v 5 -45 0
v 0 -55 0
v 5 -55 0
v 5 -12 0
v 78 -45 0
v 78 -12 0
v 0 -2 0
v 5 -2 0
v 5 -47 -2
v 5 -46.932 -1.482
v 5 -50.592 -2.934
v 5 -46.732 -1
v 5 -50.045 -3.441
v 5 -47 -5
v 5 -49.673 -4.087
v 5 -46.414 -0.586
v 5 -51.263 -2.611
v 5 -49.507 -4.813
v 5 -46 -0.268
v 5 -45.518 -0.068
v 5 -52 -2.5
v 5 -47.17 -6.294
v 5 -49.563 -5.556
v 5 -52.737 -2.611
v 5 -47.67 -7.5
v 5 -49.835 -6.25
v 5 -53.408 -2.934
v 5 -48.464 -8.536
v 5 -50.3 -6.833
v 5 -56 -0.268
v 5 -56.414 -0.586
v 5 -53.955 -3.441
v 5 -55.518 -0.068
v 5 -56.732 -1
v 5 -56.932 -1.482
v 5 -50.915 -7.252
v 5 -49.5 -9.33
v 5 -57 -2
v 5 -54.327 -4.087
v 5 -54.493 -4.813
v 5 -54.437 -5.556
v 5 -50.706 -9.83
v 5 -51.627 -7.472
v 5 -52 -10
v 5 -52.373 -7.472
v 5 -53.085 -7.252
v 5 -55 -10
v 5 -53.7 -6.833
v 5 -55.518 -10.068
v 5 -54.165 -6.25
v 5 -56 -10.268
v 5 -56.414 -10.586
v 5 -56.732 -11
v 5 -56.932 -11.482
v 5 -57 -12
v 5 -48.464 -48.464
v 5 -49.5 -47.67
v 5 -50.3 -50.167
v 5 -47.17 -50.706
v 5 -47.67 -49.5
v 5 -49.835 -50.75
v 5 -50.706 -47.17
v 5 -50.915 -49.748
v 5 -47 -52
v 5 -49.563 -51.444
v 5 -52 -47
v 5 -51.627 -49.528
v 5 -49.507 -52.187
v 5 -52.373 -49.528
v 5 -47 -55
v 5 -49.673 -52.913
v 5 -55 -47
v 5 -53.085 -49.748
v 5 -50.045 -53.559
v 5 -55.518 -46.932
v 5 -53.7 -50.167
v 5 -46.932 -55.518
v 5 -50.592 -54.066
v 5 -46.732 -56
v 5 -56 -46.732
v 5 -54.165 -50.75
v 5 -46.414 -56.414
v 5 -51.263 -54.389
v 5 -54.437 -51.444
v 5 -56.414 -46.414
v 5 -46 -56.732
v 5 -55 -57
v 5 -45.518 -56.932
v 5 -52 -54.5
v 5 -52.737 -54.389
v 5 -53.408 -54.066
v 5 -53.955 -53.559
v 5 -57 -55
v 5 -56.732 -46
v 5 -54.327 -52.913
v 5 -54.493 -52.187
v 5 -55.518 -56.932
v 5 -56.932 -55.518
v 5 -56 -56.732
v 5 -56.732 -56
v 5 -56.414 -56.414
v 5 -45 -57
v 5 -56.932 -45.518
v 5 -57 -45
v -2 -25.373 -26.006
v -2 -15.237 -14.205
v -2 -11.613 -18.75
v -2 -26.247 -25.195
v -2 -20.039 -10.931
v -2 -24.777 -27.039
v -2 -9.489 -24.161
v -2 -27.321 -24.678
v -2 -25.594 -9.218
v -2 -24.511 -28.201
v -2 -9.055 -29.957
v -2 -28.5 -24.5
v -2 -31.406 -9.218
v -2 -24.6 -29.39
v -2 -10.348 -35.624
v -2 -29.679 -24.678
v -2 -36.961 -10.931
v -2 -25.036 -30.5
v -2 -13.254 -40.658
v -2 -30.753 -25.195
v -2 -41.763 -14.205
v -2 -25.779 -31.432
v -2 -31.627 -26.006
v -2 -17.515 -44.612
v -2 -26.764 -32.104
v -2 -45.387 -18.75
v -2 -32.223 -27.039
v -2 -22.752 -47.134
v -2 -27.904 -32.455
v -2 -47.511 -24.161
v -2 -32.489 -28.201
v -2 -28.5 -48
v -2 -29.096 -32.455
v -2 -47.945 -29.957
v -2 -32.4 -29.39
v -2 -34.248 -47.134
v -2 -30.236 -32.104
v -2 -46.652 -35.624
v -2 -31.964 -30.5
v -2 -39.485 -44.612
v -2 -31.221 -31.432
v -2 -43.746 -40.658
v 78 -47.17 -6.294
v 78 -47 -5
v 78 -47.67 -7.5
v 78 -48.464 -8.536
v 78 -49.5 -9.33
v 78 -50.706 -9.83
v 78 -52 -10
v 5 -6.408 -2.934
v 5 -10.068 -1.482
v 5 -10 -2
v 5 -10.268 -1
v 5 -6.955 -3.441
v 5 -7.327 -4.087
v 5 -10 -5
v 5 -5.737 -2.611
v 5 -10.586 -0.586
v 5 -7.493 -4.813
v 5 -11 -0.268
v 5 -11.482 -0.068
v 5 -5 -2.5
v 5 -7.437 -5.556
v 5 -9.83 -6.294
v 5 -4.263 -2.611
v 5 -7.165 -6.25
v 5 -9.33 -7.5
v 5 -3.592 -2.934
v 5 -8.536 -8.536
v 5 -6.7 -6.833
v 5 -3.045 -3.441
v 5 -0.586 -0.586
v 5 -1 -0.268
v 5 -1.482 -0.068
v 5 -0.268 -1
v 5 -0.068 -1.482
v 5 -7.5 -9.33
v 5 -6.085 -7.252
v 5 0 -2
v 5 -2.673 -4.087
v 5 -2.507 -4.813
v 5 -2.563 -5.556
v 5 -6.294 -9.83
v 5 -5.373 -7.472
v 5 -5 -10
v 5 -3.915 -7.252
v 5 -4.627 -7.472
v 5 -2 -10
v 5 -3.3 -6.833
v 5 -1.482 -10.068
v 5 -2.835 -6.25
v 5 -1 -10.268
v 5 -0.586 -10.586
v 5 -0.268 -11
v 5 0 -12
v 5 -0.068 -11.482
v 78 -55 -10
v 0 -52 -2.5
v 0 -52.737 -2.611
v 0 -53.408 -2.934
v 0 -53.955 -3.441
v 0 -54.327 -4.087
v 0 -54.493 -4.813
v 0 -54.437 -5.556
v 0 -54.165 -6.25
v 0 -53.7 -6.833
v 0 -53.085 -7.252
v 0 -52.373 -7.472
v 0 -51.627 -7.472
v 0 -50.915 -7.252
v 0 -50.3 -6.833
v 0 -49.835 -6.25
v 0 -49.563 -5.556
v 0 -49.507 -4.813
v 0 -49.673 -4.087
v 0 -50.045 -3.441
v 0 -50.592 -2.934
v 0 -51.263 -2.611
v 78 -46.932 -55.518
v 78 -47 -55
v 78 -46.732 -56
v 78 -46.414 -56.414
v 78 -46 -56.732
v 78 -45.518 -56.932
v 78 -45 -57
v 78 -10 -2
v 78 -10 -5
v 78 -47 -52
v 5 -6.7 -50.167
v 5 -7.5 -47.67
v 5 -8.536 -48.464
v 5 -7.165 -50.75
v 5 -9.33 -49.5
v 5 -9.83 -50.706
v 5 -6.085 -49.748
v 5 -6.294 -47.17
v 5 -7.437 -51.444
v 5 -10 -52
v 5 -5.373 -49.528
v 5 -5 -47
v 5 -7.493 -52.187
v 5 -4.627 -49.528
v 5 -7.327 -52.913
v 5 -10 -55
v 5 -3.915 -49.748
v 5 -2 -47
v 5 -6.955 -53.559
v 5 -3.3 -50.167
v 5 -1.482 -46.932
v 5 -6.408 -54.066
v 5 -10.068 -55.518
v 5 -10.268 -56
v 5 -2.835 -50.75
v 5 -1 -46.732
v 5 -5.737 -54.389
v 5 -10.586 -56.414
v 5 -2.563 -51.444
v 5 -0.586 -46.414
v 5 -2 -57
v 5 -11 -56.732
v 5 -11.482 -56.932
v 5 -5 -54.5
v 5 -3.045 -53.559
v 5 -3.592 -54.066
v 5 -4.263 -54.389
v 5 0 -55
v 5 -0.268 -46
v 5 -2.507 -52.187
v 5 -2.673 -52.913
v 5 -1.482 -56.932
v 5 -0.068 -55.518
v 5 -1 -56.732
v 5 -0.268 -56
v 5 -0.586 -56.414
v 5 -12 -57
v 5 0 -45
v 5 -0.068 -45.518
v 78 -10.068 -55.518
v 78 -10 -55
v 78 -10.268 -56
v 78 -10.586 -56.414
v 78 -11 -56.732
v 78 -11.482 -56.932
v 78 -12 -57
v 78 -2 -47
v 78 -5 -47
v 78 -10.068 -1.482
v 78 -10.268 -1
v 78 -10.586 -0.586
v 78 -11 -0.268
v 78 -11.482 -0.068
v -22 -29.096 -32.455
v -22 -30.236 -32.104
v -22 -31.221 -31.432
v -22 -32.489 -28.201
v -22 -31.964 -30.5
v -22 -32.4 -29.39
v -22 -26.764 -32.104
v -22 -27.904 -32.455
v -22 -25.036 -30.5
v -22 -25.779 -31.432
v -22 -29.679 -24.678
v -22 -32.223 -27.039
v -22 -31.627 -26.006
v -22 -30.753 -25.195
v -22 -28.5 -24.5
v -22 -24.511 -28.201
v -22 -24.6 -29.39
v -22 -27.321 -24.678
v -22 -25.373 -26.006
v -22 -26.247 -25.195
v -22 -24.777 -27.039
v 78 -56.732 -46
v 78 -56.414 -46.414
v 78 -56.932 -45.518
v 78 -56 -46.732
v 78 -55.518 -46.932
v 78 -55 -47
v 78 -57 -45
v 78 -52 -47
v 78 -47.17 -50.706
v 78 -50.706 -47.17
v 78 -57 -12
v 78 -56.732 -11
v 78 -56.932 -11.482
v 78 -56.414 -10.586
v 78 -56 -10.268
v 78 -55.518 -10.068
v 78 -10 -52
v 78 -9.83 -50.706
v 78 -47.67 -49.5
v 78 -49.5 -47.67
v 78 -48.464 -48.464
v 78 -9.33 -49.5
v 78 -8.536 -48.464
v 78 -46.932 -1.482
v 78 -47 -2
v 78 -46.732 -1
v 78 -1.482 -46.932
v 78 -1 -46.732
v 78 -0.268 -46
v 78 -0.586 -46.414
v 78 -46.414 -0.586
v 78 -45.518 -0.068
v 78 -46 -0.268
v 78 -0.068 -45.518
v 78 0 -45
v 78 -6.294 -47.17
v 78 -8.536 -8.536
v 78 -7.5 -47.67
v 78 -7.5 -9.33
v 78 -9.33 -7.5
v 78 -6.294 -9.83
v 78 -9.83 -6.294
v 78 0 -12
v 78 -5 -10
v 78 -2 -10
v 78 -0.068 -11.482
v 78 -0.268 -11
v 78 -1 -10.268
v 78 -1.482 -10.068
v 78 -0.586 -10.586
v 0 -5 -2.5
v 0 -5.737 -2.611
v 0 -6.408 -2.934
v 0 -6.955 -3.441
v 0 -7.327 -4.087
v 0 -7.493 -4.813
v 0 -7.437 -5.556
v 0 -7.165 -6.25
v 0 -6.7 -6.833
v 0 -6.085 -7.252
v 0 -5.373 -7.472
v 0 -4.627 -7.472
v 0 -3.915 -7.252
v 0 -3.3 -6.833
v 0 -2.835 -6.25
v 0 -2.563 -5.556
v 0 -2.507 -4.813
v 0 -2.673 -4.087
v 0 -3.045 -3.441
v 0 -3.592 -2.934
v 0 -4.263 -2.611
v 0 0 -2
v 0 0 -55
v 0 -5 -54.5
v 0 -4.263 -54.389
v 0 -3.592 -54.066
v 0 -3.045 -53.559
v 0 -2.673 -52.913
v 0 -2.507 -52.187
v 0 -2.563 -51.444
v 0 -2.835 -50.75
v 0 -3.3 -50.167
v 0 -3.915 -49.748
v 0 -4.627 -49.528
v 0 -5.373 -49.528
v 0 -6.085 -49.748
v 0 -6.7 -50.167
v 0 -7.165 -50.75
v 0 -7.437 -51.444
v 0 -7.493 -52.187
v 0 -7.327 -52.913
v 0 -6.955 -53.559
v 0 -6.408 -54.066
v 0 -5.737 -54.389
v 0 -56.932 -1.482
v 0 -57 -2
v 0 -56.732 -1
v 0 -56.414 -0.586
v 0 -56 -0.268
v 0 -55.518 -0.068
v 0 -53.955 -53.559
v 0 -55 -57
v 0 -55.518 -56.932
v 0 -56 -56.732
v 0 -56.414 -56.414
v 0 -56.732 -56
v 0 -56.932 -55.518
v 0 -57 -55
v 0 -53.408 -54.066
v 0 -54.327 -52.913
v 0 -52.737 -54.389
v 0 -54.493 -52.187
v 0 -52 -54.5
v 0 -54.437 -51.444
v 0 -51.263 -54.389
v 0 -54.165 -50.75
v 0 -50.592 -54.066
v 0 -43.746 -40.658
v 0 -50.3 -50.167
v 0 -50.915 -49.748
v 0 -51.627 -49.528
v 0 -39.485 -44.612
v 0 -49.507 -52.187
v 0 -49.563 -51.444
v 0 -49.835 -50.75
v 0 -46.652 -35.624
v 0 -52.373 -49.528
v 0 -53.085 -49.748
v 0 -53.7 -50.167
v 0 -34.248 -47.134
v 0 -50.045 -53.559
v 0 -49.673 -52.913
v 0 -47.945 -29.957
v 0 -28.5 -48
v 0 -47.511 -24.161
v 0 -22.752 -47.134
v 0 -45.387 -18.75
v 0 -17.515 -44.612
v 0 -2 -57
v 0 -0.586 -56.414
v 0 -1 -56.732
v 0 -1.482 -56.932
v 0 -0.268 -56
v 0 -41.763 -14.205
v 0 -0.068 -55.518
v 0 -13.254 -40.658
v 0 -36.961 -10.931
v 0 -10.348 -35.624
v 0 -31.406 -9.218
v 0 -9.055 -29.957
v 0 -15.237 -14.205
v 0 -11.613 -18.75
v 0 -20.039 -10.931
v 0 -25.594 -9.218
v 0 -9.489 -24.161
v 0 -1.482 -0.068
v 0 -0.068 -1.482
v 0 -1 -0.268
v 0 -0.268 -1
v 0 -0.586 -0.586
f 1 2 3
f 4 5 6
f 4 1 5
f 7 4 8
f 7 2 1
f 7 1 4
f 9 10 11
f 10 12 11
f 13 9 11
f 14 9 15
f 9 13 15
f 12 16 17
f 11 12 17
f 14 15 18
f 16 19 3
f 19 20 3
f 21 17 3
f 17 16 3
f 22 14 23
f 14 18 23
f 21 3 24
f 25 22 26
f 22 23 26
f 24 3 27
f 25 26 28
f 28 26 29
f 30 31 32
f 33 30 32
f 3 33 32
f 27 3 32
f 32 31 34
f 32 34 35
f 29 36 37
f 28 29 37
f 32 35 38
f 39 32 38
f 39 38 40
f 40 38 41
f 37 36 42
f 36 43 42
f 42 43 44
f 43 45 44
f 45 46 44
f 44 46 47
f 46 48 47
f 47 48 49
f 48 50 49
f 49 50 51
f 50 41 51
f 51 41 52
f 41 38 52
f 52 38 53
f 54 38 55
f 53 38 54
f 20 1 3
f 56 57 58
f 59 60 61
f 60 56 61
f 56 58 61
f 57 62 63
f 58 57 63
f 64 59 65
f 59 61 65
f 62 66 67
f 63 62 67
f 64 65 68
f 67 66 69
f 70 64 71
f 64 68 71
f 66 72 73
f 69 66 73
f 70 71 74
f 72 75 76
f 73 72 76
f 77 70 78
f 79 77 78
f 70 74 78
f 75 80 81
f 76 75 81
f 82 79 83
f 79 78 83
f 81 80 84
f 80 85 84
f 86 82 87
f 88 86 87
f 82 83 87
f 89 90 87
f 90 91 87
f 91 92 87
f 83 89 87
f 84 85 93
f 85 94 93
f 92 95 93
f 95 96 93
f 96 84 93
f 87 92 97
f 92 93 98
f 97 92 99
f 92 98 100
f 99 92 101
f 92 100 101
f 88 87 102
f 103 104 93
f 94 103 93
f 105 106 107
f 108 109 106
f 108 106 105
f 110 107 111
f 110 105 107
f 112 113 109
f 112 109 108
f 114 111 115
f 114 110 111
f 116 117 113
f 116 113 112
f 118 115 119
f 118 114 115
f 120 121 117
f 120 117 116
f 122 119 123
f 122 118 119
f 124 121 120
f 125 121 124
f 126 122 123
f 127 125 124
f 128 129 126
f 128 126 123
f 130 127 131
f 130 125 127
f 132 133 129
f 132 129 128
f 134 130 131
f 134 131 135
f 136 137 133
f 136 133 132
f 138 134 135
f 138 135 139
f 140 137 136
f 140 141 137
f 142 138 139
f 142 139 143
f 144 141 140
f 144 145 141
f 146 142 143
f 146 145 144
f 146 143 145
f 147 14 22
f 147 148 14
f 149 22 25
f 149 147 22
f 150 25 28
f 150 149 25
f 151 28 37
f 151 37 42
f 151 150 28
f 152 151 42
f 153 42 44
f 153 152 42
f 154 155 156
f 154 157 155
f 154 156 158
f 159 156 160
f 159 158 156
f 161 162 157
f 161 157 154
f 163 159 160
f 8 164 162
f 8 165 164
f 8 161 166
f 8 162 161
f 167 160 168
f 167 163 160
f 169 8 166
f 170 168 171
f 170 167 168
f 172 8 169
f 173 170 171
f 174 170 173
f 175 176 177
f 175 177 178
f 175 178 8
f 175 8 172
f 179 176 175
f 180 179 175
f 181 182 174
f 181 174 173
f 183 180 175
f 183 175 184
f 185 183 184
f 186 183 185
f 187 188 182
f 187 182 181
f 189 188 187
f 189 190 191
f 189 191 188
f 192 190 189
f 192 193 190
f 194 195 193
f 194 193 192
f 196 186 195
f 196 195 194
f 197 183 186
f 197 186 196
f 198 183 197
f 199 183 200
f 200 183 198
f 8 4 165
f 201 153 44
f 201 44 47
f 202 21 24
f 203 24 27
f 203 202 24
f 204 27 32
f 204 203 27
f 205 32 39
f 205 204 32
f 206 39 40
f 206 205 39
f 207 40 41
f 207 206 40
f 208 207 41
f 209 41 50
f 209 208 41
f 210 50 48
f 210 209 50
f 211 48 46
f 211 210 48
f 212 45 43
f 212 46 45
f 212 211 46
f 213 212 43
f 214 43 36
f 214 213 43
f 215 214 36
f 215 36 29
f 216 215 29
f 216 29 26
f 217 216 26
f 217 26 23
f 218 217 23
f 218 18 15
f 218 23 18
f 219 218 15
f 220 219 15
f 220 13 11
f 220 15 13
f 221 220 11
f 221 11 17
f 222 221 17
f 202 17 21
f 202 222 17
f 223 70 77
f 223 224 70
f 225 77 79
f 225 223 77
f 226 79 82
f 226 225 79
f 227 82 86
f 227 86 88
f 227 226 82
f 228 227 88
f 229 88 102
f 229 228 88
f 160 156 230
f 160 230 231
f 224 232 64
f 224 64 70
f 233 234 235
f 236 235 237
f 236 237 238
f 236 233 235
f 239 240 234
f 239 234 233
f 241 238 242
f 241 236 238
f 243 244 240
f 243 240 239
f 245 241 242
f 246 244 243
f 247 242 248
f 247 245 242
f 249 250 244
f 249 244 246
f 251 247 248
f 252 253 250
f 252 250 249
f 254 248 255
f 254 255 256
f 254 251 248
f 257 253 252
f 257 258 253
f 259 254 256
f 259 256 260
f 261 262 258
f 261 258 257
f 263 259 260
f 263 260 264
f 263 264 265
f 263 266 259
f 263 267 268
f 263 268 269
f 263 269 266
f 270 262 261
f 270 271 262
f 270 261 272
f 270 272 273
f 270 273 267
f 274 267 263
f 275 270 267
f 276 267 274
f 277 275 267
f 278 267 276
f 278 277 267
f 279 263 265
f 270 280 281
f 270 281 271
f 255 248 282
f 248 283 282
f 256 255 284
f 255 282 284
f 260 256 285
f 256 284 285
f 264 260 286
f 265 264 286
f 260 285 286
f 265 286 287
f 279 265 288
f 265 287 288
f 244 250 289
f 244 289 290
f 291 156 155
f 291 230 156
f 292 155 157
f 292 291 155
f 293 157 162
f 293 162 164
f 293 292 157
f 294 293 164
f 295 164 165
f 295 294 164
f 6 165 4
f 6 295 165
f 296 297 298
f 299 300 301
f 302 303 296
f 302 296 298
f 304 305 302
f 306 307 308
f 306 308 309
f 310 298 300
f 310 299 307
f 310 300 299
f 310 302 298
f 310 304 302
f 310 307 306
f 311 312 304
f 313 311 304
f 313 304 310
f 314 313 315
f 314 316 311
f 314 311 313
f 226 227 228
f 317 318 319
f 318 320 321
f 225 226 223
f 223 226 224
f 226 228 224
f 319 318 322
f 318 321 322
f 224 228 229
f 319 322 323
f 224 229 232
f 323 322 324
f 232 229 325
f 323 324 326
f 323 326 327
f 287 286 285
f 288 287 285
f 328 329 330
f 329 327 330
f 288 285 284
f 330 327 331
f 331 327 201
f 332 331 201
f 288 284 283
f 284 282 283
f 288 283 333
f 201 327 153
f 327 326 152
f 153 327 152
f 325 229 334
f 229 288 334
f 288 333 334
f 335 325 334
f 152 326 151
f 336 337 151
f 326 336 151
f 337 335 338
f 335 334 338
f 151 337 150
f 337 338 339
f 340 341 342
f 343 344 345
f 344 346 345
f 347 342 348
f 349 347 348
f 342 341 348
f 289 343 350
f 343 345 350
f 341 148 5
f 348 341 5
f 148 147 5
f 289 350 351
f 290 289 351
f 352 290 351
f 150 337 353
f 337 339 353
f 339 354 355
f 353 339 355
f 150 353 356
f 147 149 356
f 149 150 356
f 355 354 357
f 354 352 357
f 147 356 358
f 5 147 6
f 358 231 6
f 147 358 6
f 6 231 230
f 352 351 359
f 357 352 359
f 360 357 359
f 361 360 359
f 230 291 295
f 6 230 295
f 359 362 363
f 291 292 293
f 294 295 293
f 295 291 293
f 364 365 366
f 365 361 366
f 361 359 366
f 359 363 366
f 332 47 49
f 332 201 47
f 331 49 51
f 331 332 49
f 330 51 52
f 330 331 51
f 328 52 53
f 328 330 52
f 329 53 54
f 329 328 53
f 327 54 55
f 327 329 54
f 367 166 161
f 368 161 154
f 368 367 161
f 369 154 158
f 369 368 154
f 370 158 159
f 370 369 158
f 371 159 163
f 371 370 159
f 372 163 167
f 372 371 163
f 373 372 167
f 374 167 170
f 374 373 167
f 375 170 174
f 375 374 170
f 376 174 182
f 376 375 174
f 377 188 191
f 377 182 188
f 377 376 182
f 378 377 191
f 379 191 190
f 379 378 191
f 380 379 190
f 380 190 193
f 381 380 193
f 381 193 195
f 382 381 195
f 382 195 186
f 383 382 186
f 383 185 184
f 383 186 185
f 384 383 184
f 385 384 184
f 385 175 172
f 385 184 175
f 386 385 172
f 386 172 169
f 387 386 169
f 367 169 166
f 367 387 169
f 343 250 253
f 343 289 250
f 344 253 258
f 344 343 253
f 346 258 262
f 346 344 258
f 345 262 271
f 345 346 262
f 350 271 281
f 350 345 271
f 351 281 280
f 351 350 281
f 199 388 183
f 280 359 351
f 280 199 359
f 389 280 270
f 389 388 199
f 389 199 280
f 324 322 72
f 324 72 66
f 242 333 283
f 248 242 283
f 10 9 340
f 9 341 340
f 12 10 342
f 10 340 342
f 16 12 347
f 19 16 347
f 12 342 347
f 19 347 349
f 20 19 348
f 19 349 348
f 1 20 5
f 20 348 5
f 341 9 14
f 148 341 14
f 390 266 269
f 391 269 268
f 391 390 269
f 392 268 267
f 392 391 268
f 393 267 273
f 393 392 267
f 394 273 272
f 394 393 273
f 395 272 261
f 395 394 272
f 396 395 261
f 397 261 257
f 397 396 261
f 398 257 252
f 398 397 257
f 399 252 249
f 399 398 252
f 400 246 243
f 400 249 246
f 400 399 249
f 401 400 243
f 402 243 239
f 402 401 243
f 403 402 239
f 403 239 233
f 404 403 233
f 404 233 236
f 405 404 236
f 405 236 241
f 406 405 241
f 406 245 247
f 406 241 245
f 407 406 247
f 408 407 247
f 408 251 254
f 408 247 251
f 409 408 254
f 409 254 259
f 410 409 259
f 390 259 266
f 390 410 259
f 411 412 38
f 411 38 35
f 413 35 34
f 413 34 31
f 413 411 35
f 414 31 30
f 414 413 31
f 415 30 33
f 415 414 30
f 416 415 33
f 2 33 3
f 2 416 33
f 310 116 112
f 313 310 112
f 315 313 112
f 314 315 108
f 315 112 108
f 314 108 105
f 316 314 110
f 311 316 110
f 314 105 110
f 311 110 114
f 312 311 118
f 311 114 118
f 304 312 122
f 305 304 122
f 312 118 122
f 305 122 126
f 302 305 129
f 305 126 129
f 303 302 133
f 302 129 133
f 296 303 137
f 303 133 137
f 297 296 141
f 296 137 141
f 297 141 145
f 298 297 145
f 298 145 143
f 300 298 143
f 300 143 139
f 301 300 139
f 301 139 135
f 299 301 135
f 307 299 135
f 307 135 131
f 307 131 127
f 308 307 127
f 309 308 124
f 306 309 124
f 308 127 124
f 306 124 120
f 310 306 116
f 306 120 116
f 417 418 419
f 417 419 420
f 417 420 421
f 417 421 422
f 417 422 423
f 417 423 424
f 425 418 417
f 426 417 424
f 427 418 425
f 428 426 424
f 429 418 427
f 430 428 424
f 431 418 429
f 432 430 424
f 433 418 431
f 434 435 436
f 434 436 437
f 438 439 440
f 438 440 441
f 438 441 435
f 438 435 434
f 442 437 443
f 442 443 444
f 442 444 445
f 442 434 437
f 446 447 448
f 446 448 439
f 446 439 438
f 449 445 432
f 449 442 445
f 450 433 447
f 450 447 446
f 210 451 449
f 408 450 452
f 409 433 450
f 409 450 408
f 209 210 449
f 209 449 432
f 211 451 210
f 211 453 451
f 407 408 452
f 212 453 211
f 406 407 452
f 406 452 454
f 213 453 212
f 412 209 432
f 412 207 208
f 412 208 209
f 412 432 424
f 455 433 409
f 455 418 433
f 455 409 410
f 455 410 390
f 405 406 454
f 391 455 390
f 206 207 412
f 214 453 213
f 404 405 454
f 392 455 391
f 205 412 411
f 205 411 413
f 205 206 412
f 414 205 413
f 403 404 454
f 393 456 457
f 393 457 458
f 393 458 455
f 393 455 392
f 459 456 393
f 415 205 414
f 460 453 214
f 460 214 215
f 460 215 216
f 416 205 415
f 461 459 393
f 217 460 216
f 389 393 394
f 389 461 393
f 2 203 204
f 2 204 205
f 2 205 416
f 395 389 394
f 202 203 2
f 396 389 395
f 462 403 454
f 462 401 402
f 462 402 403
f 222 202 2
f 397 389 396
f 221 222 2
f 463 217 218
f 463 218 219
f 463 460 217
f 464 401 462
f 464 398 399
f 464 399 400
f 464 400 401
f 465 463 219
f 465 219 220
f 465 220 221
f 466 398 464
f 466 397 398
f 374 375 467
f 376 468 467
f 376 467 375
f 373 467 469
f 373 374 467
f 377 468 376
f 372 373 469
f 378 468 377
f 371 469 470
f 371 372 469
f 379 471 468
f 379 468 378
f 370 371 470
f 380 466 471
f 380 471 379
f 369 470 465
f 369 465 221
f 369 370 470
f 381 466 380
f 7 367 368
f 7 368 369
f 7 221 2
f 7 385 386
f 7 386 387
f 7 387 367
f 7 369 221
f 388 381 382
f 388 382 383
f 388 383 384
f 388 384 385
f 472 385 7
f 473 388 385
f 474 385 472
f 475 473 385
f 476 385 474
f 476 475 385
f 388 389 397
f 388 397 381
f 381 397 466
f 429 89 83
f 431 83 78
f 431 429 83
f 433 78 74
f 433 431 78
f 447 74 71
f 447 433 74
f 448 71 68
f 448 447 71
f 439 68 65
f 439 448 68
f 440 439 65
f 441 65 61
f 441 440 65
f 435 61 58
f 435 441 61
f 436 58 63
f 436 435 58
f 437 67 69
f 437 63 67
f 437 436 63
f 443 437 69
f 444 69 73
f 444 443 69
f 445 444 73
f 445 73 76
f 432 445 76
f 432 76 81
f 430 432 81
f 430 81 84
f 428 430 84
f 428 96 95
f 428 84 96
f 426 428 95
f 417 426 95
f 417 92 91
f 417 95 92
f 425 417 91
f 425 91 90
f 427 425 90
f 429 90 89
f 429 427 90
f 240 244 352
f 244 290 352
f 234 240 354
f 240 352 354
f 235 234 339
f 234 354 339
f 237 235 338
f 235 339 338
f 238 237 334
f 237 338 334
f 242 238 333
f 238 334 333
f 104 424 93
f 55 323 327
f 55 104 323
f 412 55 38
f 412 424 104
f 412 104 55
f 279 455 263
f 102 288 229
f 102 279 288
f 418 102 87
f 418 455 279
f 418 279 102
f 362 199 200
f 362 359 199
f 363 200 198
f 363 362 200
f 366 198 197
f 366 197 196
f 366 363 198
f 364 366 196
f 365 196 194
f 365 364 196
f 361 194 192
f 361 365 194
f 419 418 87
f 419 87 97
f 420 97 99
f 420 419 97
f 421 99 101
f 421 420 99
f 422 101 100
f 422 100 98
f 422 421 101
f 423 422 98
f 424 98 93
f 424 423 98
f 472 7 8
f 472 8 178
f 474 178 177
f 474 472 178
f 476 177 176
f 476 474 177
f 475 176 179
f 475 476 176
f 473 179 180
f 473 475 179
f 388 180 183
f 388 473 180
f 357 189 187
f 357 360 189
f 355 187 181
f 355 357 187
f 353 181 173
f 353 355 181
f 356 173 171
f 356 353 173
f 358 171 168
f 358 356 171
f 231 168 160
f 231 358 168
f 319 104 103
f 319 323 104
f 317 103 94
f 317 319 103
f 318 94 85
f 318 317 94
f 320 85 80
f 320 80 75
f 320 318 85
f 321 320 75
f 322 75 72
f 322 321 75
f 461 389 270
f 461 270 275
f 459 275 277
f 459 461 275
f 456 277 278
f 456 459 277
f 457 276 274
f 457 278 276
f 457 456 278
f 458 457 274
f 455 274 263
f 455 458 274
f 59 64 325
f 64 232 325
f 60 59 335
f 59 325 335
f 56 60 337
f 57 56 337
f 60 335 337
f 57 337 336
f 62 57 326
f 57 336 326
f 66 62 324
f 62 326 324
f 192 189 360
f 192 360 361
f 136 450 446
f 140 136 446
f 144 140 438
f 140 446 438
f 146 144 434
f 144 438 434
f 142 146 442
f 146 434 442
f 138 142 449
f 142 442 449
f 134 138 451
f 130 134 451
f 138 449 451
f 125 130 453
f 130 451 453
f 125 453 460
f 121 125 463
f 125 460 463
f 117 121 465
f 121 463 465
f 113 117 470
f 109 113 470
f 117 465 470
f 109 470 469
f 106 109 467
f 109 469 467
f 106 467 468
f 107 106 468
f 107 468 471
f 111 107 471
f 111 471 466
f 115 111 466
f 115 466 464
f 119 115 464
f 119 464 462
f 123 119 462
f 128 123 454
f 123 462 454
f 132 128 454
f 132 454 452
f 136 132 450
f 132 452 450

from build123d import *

# Parameters (mm, degrees)
SKETCH1_R            = 2.5
BOSS_EXTRUDE2_DEPTH  = 78
CUT_EXTRUDE1_START   = -73
CUT_EXTRUDE1_DEPTH   = 73
FILLET1_R            = 5
FILLET2_R            = 2
FILLET1_OF_MIRROR3_R = 5
FILLET3_R            = 2
SKETCH5_R            = 19.5
BOSS_EXTRUDE3_DEPTH  = 2
SKETCH6_R            = 4
BOSS_EXTRUDE4_DEPTH  = 20


with BuildPart() as part:
    # Sketch1 → Boss-Extrude2 (new body)
    with BuildSketch(Plane(origin=(0, 0, 0), x_dir=(0, 0, -1), z_dir=(1, 0, 0))):
        with BuildLine():
            Line((2, 0), (55, 0))
            ThreePointArc((55, 0), (56.414213562, -0.585786438), (57, -2))
            Line((57, -2), (57, -55))
            ThreePointArc((57, -55), (56.414213562, -56.414213562), (55, -57))
            Line((55, -57), (2, -57))
            ThreePointArc((2, -57), (0.585786438, -56.414213562), (0, -55))
            Line((0, -55), (0, -2))
            ThreePointArc((0, -2), (0.585786438, -0.585786438), (2, 0))
        make_face()
        with Locations((52, -5)):
            Circle(SKETCH1_R, mode=Mode.SUBTRACT)
        with Locations((52, -52)):
            Circle(SKETCH1_R, mode=Mode.SUBTRACT)
        with Locations(Location((5, -52, 0), (0, 0, 180))):
            Circle(SKETCH1_R, mode=Mode.SUBTRACT)
        with Locations(Location((5, -5, 0), (0, 0, 180))):
            Circle(SKETCH1_R, mode=Mode.SUBTRACT)
    extrude(amount=BOSS_EXTRUDE2_DEPTH)

    # Sketch4 → Cut-Extrude1 (cut)
    with BuildSketch(Plane(origin=(78, 0, 0), x_dir=(0, 0, -1), z_dir=(1, 0, 0)).offset(CUT_EXTRUDE1_START)):
        with BuildLine():
            Line((55, 0), (47, 0))
            Line((47, 0), (47, -10))
            Line((47, -10), (57, -10))
            Line((57, -10), (57, -2))
            ThreePointArc((57, -2), (56.414213562, -0.585786438), (55, 0))
        make_face()
        with BuildLine():
            Line((0, -2), (0, -10))
            Line((0, -10), (10, -10))
            Line((10, -10), (10, 0))
            Line((10, 0), (2, 0))
            ThreePointArc((2, 0), (0.585786438, -0.585786438), (0, -2))
        make_face()
    cut_extrude1 = extrude(amount=CUT_EXTRUDE1_DEPTH, mode=Mode.SUBTRACT)

    # Fillet1
    fillet1_edges = [part.edges().sort_by_distance(p)[0] for p in [
        (41.5, -10, -10),
        (41.5, -10, -47),
    ]]
    fillet(fillet1_edges, radius=FILLET1_R)

    # Fillet2
    fillet2_edges = [part.edges().sort_by_distance(p)[0] for p in [
        (41.5, 0, -10),
        (41.5, -10, 0),
        (41.5, -10, -57),
        (41.5, 0, -47),
    ]]
    fillet(fillet2_edges, radius=FILLET2_R)

    # Mirror3: Cut-Extrude1 across plane
    add(cut_extrude1.mirror(Plane.ZX.offset(-28.5)), mode=Mode.SUBTRACT)

    # Fillet1 of Mirror3
    fillet1_of_mirror3_edges = [part.edges().sort_by_distance(p)[0] for p in [
        (41.5, -47, -10),
        (41.5, -47, -47),
    ]]
    fillet(fillet1_of_mirror3_edges, radius=FILLET1_OF_MIRROR3_R)

    # Fillet3
    fillet3_edges = [part.edges().sort_by_distance(p)[0] for p in [
        (41.5, -47, 0),
        (41.5, -57, -10),
        (41.5, -57, -47),
        (41.5, -47, -57),
    ]]
    fillet(fillet3_edges, radius=FILLET3_R)

    # Sketch5 → Boss-Extrude3 (add)
    with BuildSketch(Plane.ZY):
        with Locations(Location((-28.5, -28.5, 0), (0, 0, 180))):
            Circle(SKETCH5_R)
    extrude(amount=BOSS_EXTRUDE3_DEPTH)

    # Sketch6 → Boss-Extrude4 (add)
    with BuildSketch(Plane.ZY.offset(2)):
        with Locations((-28.5, -28.5)):
            Circle(SKETCH6_R)
    extrude(amount=BOSS_EXTRUDE4_DEPTH)


solid = part.part
